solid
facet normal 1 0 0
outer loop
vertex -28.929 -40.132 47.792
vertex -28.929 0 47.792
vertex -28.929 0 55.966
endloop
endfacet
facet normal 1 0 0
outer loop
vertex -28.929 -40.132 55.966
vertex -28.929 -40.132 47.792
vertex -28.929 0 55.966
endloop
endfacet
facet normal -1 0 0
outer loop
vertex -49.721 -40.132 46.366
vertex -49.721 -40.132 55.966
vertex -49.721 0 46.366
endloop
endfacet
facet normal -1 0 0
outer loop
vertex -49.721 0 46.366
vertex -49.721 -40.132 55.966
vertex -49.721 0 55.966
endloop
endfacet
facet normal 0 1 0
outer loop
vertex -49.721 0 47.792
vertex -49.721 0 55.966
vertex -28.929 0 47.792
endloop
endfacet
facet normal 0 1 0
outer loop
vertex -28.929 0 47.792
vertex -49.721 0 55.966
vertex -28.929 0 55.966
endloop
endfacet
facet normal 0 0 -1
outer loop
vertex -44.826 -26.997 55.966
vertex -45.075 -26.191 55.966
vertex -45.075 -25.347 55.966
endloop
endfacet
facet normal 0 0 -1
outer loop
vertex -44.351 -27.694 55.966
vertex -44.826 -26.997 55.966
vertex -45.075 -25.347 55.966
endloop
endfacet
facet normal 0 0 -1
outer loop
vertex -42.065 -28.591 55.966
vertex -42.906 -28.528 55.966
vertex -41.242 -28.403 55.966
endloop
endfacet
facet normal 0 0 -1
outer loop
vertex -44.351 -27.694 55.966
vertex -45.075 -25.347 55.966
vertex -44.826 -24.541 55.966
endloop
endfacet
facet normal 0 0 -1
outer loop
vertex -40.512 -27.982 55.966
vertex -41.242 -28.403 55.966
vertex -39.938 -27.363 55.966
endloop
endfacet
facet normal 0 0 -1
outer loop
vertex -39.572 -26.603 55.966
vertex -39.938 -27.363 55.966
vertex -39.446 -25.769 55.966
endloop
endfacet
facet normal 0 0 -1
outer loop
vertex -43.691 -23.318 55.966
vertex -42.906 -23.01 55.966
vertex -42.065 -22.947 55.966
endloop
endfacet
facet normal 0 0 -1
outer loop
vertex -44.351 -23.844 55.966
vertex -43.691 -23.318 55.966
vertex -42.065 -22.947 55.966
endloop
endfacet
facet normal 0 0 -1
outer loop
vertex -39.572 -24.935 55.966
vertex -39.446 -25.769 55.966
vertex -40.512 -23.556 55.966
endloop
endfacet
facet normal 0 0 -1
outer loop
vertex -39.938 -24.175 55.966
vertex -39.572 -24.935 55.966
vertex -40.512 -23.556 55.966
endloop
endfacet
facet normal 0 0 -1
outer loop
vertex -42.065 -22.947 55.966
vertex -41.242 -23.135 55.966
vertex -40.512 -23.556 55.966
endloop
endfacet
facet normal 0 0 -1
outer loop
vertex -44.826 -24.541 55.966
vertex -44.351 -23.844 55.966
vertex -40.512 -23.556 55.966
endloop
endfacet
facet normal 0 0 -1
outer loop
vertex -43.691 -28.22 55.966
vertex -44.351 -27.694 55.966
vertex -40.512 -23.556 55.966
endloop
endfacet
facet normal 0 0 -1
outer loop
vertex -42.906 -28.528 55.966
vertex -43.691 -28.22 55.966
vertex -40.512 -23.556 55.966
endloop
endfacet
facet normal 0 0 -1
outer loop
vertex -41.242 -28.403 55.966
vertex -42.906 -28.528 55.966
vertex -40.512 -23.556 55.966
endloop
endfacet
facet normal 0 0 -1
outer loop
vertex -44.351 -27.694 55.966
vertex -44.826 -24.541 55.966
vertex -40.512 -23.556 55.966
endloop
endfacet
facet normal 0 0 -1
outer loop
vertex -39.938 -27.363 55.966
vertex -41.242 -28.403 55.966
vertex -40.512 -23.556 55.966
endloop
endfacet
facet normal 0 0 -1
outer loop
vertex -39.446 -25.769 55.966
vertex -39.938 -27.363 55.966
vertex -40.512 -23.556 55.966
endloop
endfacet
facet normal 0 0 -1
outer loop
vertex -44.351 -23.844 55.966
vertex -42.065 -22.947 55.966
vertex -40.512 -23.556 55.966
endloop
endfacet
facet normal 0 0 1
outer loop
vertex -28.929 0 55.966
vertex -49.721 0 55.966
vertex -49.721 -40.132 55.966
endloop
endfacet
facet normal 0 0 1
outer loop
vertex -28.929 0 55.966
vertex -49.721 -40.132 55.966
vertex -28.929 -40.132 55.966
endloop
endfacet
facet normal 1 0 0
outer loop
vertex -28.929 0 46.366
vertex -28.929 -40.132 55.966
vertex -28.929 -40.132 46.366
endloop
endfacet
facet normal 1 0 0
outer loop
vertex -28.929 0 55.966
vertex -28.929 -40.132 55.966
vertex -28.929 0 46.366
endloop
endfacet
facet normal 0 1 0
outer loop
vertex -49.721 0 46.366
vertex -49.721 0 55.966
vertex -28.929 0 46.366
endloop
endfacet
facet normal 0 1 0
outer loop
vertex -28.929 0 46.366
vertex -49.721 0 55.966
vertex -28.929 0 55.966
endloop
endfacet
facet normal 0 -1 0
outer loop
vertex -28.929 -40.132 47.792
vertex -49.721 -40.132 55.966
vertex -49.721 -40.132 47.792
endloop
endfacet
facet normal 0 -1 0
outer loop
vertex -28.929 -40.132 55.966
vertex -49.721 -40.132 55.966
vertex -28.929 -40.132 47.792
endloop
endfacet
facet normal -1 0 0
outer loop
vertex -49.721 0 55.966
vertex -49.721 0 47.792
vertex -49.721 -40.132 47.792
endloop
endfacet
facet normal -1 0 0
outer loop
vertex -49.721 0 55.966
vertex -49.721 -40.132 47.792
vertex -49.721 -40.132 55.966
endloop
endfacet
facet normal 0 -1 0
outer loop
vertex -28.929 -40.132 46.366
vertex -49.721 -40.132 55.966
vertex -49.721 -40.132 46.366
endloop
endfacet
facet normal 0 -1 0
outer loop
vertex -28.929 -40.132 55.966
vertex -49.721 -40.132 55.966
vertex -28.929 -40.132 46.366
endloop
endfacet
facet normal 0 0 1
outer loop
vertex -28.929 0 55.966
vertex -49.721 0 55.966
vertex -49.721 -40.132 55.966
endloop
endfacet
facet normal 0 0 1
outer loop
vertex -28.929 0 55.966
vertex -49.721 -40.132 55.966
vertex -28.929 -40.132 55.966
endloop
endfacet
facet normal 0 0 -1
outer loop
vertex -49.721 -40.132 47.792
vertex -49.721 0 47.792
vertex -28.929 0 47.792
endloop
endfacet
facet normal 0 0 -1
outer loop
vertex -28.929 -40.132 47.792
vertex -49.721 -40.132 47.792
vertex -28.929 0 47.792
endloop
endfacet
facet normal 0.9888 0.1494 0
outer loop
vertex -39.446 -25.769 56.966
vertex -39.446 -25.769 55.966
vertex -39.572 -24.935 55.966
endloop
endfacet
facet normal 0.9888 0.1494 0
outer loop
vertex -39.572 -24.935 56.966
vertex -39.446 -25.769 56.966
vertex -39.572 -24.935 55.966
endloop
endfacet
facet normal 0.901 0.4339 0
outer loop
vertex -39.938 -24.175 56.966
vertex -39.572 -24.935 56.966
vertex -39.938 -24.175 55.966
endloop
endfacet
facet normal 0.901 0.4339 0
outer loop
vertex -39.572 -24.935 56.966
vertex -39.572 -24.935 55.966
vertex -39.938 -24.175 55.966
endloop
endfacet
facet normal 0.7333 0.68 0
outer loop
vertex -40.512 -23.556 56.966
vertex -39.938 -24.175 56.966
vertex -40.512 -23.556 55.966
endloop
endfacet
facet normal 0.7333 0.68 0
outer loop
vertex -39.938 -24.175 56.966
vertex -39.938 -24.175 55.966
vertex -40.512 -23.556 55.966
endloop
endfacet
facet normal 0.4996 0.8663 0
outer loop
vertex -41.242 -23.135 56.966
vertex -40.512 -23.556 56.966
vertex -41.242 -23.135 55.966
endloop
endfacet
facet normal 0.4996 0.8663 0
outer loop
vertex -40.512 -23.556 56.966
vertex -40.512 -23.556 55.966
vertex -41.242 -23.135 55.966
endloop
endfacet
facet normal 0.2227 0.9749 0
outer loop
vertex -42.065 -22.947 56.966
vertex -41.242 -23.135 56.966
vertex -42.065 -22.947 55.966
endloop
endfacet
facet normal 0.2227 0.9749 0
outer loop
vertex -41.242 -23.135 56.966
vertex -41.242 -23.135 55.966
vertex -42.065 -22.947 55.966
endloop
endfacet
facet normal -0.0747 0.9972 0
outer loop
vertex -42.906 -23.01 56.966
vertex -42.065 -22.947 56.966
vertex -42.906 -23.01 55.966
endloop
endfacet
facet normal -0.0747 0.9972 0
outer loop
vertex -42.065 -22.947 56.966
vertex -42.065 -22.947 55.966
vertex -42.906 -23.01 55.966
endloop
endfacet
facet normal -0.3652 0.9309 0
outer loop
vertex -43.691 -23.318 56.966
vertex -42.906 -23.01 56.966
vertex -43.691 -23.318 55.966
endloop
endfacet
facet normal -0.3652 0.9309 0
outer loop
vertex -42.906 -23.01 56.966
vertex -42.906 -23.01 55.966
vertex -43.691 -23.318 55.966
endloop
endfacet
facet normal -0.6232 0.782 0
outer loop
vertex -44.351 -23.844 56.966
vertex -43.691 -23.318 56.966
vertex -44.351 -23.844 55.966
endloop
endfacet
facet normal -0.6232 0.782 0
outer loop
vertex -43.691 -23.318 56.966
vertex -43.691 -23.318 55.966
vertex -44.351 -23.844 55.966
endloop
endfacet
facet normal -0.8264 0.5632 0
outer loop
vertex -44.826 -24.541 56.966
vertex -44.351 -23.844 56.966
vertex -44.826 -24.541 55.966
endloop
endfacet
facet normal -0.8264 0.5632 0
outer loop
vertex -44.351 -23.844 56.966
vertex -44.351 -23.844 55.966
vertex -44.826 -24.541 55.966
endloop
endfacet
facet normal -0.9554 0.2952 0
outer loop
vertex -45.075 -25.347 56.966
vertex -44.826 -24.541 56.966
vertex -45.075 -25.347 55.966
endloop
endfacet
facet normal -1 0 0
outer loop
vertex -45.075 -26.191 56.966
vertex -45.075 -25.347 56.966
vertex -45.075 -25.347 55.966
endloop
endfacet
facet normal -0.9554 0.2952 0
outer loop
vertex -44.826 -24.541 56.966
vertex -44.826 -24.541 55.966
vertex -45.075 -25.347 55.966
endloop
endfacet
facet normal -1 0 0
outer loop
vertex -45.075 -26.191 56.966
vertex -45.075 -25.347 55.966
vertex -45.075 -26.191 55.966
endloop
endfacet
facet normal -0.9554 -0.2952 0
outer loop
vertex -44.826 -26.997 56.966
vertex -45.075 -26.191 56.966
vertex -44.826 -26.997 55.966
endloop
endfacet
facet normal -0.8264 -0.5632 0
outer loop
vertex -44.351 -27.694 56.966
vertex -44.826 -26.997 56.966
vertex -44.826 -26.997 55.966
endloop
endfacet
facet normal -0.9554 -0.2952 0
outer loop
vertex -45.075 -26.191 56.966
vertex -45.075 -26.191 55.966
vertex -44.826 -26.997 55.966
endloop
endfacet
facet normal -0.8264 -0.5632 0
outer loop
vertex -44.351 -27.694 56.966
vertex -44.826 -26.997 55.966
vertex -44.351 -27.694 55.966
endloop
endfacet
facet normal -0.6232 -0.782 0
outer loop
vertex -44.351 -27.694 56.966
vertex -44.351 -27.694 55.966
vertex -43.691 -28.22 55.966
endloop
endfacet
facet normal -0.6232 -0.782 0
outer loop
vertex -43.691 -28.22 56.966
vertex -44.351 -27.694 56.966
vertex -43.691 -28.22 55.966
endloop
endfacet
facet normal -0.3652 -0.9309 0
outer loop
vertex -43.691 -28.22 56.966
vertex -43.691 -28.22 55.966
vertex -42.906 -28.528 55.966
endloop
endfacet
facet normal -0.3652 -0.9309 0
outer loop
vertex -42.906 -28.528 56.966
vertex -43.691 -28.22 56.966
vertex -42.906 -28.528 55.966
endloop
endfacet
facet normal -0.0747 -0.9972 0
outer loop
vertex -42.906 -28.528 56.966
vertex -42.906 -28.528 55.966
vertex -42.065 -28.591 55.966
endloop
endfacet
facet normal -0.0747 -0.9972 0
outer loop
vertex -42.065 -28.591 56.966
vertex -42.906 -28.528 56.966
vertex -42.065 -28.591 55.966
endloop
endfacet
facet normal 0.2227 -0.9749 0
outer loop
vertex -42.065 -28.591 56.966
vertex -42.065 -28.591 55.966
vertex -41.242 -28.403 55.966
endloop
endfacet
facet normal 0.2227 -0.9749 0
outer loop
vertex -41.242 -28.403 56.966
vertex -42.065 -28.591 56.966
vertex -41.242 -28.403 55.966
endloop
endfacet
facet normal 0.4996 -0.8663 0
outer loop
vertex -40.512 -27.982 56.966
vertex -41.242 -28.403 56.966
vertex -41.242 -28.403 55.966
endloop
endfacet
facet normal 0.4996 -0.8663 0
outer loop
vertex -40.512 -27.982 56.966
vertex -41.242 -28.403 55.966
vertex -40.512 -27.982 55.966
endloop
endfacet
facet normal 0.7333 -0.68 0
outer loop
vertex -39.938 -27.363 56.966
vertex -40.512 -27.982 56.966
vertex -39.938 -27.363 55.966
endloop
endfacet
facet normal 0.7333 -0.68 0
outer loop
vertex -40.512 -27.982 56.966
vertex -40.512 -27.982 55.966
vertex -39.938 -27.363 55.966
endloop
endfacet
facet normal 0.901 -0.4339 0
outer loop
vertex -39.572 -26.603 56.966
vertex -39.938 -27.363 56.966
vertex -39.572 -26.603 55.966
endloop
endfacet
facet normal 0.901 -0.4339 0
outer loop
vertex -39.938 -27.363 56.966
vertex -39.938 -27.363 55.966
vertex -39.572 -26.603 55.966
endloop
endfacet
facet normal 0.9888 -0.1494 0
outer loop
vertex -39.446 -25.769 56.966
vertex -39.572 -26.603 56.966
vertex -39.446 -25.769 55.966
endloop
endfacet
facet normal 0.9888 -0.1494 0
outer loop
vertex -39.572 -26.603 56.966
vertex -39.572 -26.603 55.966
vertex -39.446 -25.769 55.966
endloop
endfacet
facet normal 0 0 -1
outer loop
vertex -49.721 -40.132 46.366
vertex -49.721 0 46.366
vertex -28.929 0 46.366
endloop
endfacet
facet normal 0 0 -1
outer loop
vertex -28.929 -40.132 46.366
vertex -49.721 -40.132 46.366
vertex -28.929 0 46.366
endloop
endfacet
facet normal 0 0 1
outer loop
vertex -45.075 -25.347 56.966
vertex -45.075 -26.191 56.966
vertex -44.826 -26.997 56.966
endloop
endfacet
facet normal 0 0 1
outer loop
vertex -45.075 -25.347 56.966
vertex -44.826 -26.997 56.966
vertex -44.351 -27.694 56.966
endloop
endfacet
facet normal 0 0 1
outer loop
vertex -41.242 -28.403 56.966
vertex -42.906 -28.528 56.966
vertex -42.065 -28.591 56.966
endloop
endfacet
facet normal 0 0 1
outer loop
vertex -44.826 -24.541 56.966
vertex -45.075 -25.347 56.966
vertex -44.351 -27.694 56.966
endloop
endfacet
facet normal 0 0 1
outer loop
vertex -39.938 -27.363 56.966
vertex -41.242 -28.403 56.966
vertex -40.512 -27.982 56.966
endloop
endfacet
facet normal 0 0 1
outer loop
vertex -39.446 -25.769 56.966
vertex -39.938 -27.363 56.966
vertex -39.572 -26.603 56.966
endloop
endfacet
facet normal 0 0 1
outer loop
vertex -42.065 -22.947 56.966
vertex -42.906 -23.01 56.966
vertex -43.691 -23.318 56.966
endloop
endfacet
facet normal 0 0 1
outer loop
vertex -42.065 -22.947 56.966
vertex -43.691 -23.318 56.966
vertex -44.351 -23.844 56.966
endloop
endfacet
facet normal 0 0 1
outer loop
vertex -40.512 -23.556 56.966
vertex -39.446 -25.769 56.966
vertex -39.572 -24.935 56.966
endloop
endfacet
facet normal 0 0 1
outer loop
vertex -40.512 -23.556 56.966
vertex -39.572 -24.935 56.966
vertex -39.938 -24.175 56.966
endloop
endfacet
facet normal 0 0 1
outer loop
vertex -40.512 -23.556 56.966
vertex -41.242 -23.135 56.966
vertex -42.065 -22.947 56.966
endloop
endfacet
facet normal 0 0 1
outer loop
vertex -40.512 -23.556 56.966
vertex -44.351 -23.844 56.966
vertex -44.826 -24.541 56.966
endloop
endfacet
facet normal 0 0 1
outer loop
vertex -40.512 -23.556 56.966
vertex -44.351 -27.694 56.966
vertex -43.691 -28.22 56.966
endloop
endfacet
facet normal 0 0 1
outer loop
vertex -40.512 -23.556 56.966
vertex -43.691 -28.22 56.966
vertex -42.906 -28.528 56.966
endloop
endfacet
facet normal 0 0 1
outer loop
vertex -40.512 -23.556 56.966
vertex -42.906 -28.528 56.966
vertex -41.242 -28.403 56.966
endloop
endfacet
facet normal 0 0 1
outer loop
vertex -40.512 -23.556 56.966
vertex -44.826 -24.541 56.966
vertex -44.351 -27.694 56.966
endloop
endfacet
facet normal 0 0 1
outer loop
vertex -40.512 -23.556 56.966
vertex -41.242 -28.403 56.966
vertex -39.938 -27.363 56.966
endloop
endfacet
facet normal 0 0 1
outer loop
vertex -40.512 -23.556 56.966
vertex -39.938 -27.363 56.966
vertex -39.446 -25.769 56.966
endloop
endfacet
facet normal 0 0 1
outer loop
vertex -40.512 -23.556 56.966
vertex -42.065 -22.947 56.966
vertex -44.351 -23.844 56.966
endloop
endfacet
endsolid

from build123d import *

# Parameters (mm, degrees)
F0_W      = 20.792707
F0_H      = 8.173682
F1_DEPTH  = 40.132
F1_FACE_W = 20.792708
F1_FACE_H = 40.132
F2_DEPTH  = 9.6
F3_R      = 2.830094
F4_DEPTH  = 1


with BuildPart() as f1:
    # F0 (on Front) → F1 (new body)
    with BuildSketch(Plane.XZ):
        with Locations((-39.32491, 51.878687)):
            Rectangle(F0_W, F0_H)
    extrude(amount=F1_DEPTH)


with BuildPart() as f2:
    # F1_face (on face) → F2 (new body)
    with BuildSketch(Plane(origin=(-39.324909, -20.066, 55.965528), x_dir=(1, 0, 0), z_dir=(0, 0, 1))):
        Rectangle(F1_FACE_W, F1_FACE_H)
    extrude(amount=-F2_DEPTH)


with BuildPart() as f4:
    # F3 (on face) → F4 (new body)
    with BuildSketch(Plane.XY.offset(55.965528)):
        with Locations((-42.276166, -25.768988)):
            Circle(F3_R)
    extrude(amount=F4_DEPTH)


solid = Compound([f1.part, f2.part, f4.part])
